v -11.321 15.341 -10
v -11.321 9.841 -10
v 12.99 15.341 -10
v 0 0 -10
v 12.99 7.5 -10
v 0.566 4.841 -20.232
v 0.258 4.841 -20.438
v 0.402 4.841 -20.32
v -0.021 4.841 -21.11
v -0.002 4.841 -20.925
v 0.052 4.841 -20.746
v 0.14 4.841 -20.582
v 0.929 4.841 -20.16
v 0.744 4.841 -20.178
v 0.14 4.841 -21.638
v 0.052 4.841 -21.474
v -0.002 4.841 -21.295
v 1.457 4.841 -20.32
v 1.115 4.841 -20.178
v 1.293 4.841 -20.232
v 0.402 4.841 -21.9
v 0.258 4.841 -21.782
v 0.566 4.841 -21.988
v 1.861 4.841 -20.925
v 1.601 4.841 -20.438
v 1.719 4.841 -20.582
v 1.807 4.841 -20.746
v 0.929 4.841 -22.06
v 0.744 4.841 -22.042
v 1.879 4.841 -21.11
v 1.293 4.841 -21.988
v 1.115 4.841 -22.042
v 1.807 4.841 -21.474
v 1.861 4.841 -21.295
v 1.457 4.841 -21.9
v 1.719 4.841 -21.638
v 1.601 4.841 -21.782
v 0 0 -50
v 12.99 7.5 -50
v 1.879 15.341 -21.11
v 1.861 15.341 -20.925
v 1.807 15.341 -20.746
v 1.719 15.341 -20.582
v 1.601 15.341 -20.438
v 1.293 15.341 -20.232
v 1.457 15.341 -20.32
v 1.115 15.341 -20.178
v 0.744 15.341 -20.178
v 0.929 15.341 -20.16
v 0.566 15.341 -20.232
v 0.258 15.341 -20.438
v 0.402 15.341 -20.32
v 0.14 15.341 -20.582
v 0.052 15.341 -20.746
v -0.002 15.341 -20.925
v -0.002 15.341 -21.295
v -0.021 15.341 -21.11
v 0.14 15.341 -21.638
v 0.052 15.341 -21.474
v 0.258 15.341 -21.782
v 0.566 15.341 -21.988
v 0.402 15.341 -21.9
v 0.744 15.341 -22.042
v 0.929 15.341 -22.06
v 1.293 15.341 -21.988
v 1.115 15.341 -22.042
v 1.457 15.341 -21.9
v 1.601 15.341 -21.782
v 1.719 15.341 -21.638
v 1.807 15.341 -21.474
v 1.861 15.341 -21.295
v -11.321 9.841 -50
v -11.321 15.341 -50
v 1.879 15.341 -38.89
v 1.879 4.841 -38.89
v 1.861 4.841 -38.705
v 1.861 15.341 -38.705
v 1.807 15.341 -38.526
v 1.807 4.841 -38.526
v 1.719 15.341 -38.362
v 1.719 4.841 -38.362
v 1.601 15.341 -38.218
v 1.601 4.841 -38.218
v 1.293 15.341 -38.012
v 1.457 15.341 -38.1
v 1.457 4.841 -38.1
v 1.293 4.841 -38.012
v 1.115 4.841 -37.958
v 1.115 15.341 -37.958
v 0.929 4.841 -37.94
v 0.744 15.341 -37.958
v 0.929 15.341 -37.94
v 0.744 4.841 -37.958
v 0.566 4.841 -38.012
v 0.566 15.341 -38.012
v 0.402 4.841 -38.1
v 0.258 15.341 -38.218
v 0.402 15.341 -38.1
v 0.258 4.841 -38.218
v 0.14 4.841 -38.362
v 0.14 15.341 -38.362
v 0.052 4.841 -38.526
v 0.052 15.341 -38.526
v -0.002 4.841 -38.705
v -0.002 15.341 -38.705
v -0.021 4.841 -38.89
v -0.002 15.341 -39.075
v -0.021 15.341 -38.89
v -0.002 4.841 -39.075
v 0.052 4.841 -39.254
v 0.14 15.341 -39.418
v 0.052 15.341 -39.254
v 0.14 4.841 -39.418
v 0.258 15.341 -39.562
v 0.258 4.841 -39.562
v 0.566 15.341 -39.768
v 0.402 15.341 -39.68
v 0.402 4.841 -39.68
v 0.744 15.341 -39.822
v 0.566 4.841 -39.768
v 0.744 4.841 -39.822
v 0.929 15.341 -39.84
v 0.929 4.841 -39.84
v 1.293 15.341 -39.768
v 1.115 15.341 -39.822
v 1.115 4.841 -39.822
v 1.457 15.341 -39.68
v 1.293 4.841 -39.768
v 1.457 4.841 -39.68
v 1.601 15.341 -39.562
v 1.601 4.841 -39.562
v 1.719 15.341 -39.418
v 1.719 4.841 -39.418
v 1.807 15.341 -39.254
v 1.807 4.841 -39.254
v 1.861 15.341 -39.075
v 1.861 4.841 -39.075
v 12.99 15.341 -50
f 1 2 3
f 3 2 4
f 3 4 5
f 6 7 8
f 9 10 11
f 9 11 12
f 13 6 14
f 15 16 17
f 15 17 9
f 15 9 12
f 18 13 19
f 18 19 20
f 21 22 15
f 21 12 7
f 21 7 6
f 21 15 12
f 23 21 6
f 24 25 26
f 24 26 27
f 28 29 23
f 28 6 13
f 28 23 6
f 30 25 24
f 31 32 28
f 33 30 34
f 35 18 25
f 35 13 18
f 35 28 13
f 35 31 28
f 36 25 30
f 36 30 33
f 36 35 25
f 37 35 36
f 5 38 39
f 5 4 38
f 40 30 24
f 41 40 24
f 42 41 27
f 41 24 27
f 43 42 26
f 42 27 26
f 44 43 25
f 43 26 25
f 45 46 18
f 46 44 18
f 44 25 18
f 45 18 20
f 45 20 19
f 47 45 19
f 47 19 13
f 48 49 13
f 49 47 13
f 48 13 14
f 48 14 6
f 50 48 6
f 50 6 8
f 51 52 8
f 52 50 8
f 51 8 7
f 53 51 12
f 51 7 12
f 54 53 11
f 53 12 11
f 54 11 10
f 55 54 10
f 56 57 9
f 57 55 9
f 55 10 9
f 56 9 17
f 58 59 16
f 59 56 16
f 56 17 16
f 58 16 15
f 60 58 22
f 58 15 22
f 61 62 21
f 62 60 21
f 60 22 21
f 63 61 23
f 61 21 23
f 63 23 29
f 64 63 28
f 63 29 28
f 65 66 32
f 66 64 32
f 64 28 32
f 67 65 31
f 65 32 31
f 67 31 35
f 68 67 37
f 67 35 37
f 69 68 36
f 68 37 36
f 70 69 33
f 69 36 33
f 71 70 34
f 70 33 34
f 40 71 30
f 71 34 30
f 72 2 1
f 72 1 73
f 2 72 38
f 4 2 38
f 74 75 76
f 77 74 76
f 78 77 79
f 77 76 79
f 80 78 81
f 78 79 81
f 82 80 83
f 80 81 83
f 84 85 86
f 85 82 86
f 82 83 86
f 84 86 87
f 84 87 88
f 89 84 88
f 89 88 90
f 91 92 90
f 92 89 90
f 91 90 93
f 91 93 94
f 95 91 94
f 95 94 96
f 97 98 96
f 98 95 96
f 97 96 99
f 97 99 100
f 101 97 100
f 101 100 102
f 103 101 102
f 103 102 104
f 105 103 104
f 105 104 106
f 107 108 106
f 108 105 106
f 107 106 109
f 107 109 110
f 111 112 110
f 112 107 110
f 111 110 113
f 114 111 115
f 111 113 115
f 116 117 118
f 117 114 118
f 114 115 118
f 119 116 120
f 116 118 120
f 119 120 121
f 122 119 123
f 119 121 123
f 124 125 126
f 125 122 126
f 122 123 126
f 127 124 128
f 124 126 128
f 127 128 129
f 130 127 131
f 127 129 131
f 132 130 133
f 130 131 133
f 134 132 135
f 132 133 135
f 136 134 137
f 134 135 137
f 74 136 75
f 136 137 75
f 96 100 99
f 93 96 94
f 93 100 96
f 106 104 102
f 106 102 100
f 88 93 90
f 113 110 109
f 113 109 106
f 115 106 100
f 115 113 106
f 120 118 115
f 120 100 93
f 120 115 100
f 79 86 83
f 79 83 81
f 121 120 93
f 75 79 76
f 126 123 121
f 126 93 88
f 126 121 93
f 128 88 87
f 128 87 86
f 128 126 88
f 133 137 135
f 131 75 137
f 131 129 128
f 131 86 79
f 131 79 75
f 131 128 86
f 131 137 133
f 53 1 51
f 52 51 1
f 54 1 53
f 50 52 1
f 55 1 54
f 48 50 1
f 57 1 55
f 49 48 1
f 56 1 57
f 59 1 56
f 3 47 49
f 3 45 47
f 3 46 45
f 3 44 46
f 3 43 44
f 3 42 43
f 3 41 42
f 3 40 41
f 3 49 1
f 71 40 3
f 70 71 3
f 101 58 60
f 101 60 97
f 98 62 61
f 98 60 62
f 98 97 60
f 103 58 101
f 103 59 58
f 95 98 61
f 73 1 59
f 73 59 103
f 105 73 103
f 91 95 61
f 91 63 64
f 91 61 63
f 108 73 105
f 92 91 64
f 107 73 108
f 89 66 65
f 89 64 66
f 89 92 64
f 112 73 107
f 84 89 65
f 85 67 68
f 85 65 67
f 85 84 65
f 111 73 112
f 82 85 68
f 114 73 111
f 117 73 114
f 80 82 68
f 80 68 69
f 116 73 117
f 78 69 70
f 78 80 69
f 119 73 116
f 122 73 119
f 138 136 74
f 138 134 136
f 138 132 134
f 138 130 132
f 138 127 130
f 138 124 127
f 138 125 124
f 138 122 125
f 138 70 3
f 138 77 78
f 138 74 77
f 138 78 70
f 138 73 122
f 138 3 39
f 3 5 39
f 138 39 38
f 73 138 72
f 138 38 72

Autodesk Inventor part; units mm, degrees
ref_plane "YZ Plane" through (0, 0, 0) normal (1, 0, 0) x (0, 1, 0)
ref_plane "XZ Plane" through (0, 0, 0) normal (0, 1, 0) x (-1, 0, 0)
ref_plane "XY Plane" through (0, 0, 0) normal (0, 0, 1) x (1, 0, 0)
sketch "Sketch1" plane through (0, 0, 0) normal (0, 0, 1) x (1, 0, 0)
  line L0 (0, 0) -> (12.9904, 7.5) construction
  line L1 (0, 0) -> (15, 0) construction
  line L2 (0, 0) -> (-11.3206, 9.8409) construction
  line L3 (0, 0) -> (15, 0) construction
  line L4 (-11.3206, 9.8409) -> (12.9904, 7.5) construction
  line L5 (-11.3206, 9.8409) -> (0, 0)
  line L6 (0, 0) -> (12.9904, 7.5)
  line L7 (12.9904, 7.5) -> (-11.3206, 9.8409)
  line L8 (-11.3206, 9.8409) -> (12.8169, 9.8409) construction
  line L9 (12.8169, 9.8409) -> (12.9904, 7.5) construction
  dimension "d3" = 15
  dimension "d4" = 30
  dimension "d5" = 15
  dimension "d6" = 139
  dimension "d15" = 24.1376
extrude "Extrusion1" add sketch "Sketch1" against normal blind 60
sketch "Sketch4" plane through (0, 0, 0) normal (0, 0, 1) x (1, 0, 0)
  line L0 (-11.3206, 9.8409) -> (12.9904, 7.5) projected
  line L1 (-11.3206, 9.8409) -> (12.9904, 9.8409)
  line L2 (12.9904, 9.8409) -> (12.9904, 7.5)
  point P0 (0, 0)
extrude "Extrusion4" add sketch "Sketch4" against normal blind 60
sketch "Sketch5" plane through (-11.3206, 9.8409, 0) normal (0, 1, 0) x (1, 0, 0)
  line L0 (24.311, 0) -> (0, 0) projected
  line L1 (24.311, 0) -> (24.311, 60) projected
  line L2 (0, 60) -> (24.311, 60) projected
  line L3 (0, 0) -> (0, 60) projected
  line L4 (0, 0) -> (0, 60) projected
  line L5 (0, 30) -> (12.25, 30)
  line L6 (12.25, 30) -> (12.25, 38.89)
  line L7 (11.3206, 0) -> (11.3206, 60) projected
  line L8 (12.25, 30) -> (21.14, 30) construction
  circle A0 centre (12.25, 38.89) radius 0.95
  line L9 (12.25, 30) -> (12.25, 21.11)
  circle A1 centre (12.25, 21.11) radius 0.95
  dimension "d16" = 12.25
  dimension "d17" = 8.89
  dimension "d18" = 90
  dimension "d19" = 1.9
  dimension "d20" = 8.89
  dimension "d21" = 1.9
extrude "Extrusion5" cut sketch "Sketch5" against normal blind 5 contours A1 L7 | L7 A1 | A0 L7 | L7 A0
sketch "Sketch6" plane through (-11.3206, 9.8409, 0) normal (0, 1, 0) x (1, 0, 0)
  circle A0 centre (12.25, 38.89) radius 0.95 projected
  circle A1 centre (12.25, 21.11) radius 0.95 projected
  line L0 (24.311, 0) -> (0, 0) projected
  line L1 (24.311, 0) -> (24.311, 60) projected
  line L2 (0, 60) -> (24.311, 60) projected
  line L3 (0, 0) -> (0, 60) projected
  line L4 (11.3206, 0) -> (11.3206, 10)
  line L5 (11.3206, 0) -> (11.3206, 60) projected
  line L6 (11.3206, 60) -> (11.3206, 50)
  line L7 (0, 0) -> (0, 60) projected
  line L8 (0, 10) -> (24.311, 10)
  line L9 (0, 50) -> (24.311, 50)
  dimension "d24" = 10
  dimension "d25" = 10
extrude "Extrusion6" cut sketch "Sketch6" against normal blind 20 contours L9 L3 L2 L5 | L5 L2 L1 L9 | L8 L4 L0 L3 | L1 L0 L4 L8
sketch "Sketch7" plane through (-11.3206, 9.8409, -50) normal (0, 1, 0) x (1, 0, 0)
  line L0 (24.311, 0) -> (0, 0) projected
  line L1 (0, -40) -> (0, 0) projected
  line L2 (0, -40) -> (24.311, -40) projected
  line L3 (24.311, -40) -> (24.311, 0) projected
  circle A0 centre (12.25, -11.11) radius 0.95 projected
  circle A1 centre (12.25, -28.89) radius 0.95 projected
  point P0 (11.3206, -50)
extrude "Extrusion7" add sketch "Sketch7" along normal blind 5.5
properties part number "MirrorMountTest"
